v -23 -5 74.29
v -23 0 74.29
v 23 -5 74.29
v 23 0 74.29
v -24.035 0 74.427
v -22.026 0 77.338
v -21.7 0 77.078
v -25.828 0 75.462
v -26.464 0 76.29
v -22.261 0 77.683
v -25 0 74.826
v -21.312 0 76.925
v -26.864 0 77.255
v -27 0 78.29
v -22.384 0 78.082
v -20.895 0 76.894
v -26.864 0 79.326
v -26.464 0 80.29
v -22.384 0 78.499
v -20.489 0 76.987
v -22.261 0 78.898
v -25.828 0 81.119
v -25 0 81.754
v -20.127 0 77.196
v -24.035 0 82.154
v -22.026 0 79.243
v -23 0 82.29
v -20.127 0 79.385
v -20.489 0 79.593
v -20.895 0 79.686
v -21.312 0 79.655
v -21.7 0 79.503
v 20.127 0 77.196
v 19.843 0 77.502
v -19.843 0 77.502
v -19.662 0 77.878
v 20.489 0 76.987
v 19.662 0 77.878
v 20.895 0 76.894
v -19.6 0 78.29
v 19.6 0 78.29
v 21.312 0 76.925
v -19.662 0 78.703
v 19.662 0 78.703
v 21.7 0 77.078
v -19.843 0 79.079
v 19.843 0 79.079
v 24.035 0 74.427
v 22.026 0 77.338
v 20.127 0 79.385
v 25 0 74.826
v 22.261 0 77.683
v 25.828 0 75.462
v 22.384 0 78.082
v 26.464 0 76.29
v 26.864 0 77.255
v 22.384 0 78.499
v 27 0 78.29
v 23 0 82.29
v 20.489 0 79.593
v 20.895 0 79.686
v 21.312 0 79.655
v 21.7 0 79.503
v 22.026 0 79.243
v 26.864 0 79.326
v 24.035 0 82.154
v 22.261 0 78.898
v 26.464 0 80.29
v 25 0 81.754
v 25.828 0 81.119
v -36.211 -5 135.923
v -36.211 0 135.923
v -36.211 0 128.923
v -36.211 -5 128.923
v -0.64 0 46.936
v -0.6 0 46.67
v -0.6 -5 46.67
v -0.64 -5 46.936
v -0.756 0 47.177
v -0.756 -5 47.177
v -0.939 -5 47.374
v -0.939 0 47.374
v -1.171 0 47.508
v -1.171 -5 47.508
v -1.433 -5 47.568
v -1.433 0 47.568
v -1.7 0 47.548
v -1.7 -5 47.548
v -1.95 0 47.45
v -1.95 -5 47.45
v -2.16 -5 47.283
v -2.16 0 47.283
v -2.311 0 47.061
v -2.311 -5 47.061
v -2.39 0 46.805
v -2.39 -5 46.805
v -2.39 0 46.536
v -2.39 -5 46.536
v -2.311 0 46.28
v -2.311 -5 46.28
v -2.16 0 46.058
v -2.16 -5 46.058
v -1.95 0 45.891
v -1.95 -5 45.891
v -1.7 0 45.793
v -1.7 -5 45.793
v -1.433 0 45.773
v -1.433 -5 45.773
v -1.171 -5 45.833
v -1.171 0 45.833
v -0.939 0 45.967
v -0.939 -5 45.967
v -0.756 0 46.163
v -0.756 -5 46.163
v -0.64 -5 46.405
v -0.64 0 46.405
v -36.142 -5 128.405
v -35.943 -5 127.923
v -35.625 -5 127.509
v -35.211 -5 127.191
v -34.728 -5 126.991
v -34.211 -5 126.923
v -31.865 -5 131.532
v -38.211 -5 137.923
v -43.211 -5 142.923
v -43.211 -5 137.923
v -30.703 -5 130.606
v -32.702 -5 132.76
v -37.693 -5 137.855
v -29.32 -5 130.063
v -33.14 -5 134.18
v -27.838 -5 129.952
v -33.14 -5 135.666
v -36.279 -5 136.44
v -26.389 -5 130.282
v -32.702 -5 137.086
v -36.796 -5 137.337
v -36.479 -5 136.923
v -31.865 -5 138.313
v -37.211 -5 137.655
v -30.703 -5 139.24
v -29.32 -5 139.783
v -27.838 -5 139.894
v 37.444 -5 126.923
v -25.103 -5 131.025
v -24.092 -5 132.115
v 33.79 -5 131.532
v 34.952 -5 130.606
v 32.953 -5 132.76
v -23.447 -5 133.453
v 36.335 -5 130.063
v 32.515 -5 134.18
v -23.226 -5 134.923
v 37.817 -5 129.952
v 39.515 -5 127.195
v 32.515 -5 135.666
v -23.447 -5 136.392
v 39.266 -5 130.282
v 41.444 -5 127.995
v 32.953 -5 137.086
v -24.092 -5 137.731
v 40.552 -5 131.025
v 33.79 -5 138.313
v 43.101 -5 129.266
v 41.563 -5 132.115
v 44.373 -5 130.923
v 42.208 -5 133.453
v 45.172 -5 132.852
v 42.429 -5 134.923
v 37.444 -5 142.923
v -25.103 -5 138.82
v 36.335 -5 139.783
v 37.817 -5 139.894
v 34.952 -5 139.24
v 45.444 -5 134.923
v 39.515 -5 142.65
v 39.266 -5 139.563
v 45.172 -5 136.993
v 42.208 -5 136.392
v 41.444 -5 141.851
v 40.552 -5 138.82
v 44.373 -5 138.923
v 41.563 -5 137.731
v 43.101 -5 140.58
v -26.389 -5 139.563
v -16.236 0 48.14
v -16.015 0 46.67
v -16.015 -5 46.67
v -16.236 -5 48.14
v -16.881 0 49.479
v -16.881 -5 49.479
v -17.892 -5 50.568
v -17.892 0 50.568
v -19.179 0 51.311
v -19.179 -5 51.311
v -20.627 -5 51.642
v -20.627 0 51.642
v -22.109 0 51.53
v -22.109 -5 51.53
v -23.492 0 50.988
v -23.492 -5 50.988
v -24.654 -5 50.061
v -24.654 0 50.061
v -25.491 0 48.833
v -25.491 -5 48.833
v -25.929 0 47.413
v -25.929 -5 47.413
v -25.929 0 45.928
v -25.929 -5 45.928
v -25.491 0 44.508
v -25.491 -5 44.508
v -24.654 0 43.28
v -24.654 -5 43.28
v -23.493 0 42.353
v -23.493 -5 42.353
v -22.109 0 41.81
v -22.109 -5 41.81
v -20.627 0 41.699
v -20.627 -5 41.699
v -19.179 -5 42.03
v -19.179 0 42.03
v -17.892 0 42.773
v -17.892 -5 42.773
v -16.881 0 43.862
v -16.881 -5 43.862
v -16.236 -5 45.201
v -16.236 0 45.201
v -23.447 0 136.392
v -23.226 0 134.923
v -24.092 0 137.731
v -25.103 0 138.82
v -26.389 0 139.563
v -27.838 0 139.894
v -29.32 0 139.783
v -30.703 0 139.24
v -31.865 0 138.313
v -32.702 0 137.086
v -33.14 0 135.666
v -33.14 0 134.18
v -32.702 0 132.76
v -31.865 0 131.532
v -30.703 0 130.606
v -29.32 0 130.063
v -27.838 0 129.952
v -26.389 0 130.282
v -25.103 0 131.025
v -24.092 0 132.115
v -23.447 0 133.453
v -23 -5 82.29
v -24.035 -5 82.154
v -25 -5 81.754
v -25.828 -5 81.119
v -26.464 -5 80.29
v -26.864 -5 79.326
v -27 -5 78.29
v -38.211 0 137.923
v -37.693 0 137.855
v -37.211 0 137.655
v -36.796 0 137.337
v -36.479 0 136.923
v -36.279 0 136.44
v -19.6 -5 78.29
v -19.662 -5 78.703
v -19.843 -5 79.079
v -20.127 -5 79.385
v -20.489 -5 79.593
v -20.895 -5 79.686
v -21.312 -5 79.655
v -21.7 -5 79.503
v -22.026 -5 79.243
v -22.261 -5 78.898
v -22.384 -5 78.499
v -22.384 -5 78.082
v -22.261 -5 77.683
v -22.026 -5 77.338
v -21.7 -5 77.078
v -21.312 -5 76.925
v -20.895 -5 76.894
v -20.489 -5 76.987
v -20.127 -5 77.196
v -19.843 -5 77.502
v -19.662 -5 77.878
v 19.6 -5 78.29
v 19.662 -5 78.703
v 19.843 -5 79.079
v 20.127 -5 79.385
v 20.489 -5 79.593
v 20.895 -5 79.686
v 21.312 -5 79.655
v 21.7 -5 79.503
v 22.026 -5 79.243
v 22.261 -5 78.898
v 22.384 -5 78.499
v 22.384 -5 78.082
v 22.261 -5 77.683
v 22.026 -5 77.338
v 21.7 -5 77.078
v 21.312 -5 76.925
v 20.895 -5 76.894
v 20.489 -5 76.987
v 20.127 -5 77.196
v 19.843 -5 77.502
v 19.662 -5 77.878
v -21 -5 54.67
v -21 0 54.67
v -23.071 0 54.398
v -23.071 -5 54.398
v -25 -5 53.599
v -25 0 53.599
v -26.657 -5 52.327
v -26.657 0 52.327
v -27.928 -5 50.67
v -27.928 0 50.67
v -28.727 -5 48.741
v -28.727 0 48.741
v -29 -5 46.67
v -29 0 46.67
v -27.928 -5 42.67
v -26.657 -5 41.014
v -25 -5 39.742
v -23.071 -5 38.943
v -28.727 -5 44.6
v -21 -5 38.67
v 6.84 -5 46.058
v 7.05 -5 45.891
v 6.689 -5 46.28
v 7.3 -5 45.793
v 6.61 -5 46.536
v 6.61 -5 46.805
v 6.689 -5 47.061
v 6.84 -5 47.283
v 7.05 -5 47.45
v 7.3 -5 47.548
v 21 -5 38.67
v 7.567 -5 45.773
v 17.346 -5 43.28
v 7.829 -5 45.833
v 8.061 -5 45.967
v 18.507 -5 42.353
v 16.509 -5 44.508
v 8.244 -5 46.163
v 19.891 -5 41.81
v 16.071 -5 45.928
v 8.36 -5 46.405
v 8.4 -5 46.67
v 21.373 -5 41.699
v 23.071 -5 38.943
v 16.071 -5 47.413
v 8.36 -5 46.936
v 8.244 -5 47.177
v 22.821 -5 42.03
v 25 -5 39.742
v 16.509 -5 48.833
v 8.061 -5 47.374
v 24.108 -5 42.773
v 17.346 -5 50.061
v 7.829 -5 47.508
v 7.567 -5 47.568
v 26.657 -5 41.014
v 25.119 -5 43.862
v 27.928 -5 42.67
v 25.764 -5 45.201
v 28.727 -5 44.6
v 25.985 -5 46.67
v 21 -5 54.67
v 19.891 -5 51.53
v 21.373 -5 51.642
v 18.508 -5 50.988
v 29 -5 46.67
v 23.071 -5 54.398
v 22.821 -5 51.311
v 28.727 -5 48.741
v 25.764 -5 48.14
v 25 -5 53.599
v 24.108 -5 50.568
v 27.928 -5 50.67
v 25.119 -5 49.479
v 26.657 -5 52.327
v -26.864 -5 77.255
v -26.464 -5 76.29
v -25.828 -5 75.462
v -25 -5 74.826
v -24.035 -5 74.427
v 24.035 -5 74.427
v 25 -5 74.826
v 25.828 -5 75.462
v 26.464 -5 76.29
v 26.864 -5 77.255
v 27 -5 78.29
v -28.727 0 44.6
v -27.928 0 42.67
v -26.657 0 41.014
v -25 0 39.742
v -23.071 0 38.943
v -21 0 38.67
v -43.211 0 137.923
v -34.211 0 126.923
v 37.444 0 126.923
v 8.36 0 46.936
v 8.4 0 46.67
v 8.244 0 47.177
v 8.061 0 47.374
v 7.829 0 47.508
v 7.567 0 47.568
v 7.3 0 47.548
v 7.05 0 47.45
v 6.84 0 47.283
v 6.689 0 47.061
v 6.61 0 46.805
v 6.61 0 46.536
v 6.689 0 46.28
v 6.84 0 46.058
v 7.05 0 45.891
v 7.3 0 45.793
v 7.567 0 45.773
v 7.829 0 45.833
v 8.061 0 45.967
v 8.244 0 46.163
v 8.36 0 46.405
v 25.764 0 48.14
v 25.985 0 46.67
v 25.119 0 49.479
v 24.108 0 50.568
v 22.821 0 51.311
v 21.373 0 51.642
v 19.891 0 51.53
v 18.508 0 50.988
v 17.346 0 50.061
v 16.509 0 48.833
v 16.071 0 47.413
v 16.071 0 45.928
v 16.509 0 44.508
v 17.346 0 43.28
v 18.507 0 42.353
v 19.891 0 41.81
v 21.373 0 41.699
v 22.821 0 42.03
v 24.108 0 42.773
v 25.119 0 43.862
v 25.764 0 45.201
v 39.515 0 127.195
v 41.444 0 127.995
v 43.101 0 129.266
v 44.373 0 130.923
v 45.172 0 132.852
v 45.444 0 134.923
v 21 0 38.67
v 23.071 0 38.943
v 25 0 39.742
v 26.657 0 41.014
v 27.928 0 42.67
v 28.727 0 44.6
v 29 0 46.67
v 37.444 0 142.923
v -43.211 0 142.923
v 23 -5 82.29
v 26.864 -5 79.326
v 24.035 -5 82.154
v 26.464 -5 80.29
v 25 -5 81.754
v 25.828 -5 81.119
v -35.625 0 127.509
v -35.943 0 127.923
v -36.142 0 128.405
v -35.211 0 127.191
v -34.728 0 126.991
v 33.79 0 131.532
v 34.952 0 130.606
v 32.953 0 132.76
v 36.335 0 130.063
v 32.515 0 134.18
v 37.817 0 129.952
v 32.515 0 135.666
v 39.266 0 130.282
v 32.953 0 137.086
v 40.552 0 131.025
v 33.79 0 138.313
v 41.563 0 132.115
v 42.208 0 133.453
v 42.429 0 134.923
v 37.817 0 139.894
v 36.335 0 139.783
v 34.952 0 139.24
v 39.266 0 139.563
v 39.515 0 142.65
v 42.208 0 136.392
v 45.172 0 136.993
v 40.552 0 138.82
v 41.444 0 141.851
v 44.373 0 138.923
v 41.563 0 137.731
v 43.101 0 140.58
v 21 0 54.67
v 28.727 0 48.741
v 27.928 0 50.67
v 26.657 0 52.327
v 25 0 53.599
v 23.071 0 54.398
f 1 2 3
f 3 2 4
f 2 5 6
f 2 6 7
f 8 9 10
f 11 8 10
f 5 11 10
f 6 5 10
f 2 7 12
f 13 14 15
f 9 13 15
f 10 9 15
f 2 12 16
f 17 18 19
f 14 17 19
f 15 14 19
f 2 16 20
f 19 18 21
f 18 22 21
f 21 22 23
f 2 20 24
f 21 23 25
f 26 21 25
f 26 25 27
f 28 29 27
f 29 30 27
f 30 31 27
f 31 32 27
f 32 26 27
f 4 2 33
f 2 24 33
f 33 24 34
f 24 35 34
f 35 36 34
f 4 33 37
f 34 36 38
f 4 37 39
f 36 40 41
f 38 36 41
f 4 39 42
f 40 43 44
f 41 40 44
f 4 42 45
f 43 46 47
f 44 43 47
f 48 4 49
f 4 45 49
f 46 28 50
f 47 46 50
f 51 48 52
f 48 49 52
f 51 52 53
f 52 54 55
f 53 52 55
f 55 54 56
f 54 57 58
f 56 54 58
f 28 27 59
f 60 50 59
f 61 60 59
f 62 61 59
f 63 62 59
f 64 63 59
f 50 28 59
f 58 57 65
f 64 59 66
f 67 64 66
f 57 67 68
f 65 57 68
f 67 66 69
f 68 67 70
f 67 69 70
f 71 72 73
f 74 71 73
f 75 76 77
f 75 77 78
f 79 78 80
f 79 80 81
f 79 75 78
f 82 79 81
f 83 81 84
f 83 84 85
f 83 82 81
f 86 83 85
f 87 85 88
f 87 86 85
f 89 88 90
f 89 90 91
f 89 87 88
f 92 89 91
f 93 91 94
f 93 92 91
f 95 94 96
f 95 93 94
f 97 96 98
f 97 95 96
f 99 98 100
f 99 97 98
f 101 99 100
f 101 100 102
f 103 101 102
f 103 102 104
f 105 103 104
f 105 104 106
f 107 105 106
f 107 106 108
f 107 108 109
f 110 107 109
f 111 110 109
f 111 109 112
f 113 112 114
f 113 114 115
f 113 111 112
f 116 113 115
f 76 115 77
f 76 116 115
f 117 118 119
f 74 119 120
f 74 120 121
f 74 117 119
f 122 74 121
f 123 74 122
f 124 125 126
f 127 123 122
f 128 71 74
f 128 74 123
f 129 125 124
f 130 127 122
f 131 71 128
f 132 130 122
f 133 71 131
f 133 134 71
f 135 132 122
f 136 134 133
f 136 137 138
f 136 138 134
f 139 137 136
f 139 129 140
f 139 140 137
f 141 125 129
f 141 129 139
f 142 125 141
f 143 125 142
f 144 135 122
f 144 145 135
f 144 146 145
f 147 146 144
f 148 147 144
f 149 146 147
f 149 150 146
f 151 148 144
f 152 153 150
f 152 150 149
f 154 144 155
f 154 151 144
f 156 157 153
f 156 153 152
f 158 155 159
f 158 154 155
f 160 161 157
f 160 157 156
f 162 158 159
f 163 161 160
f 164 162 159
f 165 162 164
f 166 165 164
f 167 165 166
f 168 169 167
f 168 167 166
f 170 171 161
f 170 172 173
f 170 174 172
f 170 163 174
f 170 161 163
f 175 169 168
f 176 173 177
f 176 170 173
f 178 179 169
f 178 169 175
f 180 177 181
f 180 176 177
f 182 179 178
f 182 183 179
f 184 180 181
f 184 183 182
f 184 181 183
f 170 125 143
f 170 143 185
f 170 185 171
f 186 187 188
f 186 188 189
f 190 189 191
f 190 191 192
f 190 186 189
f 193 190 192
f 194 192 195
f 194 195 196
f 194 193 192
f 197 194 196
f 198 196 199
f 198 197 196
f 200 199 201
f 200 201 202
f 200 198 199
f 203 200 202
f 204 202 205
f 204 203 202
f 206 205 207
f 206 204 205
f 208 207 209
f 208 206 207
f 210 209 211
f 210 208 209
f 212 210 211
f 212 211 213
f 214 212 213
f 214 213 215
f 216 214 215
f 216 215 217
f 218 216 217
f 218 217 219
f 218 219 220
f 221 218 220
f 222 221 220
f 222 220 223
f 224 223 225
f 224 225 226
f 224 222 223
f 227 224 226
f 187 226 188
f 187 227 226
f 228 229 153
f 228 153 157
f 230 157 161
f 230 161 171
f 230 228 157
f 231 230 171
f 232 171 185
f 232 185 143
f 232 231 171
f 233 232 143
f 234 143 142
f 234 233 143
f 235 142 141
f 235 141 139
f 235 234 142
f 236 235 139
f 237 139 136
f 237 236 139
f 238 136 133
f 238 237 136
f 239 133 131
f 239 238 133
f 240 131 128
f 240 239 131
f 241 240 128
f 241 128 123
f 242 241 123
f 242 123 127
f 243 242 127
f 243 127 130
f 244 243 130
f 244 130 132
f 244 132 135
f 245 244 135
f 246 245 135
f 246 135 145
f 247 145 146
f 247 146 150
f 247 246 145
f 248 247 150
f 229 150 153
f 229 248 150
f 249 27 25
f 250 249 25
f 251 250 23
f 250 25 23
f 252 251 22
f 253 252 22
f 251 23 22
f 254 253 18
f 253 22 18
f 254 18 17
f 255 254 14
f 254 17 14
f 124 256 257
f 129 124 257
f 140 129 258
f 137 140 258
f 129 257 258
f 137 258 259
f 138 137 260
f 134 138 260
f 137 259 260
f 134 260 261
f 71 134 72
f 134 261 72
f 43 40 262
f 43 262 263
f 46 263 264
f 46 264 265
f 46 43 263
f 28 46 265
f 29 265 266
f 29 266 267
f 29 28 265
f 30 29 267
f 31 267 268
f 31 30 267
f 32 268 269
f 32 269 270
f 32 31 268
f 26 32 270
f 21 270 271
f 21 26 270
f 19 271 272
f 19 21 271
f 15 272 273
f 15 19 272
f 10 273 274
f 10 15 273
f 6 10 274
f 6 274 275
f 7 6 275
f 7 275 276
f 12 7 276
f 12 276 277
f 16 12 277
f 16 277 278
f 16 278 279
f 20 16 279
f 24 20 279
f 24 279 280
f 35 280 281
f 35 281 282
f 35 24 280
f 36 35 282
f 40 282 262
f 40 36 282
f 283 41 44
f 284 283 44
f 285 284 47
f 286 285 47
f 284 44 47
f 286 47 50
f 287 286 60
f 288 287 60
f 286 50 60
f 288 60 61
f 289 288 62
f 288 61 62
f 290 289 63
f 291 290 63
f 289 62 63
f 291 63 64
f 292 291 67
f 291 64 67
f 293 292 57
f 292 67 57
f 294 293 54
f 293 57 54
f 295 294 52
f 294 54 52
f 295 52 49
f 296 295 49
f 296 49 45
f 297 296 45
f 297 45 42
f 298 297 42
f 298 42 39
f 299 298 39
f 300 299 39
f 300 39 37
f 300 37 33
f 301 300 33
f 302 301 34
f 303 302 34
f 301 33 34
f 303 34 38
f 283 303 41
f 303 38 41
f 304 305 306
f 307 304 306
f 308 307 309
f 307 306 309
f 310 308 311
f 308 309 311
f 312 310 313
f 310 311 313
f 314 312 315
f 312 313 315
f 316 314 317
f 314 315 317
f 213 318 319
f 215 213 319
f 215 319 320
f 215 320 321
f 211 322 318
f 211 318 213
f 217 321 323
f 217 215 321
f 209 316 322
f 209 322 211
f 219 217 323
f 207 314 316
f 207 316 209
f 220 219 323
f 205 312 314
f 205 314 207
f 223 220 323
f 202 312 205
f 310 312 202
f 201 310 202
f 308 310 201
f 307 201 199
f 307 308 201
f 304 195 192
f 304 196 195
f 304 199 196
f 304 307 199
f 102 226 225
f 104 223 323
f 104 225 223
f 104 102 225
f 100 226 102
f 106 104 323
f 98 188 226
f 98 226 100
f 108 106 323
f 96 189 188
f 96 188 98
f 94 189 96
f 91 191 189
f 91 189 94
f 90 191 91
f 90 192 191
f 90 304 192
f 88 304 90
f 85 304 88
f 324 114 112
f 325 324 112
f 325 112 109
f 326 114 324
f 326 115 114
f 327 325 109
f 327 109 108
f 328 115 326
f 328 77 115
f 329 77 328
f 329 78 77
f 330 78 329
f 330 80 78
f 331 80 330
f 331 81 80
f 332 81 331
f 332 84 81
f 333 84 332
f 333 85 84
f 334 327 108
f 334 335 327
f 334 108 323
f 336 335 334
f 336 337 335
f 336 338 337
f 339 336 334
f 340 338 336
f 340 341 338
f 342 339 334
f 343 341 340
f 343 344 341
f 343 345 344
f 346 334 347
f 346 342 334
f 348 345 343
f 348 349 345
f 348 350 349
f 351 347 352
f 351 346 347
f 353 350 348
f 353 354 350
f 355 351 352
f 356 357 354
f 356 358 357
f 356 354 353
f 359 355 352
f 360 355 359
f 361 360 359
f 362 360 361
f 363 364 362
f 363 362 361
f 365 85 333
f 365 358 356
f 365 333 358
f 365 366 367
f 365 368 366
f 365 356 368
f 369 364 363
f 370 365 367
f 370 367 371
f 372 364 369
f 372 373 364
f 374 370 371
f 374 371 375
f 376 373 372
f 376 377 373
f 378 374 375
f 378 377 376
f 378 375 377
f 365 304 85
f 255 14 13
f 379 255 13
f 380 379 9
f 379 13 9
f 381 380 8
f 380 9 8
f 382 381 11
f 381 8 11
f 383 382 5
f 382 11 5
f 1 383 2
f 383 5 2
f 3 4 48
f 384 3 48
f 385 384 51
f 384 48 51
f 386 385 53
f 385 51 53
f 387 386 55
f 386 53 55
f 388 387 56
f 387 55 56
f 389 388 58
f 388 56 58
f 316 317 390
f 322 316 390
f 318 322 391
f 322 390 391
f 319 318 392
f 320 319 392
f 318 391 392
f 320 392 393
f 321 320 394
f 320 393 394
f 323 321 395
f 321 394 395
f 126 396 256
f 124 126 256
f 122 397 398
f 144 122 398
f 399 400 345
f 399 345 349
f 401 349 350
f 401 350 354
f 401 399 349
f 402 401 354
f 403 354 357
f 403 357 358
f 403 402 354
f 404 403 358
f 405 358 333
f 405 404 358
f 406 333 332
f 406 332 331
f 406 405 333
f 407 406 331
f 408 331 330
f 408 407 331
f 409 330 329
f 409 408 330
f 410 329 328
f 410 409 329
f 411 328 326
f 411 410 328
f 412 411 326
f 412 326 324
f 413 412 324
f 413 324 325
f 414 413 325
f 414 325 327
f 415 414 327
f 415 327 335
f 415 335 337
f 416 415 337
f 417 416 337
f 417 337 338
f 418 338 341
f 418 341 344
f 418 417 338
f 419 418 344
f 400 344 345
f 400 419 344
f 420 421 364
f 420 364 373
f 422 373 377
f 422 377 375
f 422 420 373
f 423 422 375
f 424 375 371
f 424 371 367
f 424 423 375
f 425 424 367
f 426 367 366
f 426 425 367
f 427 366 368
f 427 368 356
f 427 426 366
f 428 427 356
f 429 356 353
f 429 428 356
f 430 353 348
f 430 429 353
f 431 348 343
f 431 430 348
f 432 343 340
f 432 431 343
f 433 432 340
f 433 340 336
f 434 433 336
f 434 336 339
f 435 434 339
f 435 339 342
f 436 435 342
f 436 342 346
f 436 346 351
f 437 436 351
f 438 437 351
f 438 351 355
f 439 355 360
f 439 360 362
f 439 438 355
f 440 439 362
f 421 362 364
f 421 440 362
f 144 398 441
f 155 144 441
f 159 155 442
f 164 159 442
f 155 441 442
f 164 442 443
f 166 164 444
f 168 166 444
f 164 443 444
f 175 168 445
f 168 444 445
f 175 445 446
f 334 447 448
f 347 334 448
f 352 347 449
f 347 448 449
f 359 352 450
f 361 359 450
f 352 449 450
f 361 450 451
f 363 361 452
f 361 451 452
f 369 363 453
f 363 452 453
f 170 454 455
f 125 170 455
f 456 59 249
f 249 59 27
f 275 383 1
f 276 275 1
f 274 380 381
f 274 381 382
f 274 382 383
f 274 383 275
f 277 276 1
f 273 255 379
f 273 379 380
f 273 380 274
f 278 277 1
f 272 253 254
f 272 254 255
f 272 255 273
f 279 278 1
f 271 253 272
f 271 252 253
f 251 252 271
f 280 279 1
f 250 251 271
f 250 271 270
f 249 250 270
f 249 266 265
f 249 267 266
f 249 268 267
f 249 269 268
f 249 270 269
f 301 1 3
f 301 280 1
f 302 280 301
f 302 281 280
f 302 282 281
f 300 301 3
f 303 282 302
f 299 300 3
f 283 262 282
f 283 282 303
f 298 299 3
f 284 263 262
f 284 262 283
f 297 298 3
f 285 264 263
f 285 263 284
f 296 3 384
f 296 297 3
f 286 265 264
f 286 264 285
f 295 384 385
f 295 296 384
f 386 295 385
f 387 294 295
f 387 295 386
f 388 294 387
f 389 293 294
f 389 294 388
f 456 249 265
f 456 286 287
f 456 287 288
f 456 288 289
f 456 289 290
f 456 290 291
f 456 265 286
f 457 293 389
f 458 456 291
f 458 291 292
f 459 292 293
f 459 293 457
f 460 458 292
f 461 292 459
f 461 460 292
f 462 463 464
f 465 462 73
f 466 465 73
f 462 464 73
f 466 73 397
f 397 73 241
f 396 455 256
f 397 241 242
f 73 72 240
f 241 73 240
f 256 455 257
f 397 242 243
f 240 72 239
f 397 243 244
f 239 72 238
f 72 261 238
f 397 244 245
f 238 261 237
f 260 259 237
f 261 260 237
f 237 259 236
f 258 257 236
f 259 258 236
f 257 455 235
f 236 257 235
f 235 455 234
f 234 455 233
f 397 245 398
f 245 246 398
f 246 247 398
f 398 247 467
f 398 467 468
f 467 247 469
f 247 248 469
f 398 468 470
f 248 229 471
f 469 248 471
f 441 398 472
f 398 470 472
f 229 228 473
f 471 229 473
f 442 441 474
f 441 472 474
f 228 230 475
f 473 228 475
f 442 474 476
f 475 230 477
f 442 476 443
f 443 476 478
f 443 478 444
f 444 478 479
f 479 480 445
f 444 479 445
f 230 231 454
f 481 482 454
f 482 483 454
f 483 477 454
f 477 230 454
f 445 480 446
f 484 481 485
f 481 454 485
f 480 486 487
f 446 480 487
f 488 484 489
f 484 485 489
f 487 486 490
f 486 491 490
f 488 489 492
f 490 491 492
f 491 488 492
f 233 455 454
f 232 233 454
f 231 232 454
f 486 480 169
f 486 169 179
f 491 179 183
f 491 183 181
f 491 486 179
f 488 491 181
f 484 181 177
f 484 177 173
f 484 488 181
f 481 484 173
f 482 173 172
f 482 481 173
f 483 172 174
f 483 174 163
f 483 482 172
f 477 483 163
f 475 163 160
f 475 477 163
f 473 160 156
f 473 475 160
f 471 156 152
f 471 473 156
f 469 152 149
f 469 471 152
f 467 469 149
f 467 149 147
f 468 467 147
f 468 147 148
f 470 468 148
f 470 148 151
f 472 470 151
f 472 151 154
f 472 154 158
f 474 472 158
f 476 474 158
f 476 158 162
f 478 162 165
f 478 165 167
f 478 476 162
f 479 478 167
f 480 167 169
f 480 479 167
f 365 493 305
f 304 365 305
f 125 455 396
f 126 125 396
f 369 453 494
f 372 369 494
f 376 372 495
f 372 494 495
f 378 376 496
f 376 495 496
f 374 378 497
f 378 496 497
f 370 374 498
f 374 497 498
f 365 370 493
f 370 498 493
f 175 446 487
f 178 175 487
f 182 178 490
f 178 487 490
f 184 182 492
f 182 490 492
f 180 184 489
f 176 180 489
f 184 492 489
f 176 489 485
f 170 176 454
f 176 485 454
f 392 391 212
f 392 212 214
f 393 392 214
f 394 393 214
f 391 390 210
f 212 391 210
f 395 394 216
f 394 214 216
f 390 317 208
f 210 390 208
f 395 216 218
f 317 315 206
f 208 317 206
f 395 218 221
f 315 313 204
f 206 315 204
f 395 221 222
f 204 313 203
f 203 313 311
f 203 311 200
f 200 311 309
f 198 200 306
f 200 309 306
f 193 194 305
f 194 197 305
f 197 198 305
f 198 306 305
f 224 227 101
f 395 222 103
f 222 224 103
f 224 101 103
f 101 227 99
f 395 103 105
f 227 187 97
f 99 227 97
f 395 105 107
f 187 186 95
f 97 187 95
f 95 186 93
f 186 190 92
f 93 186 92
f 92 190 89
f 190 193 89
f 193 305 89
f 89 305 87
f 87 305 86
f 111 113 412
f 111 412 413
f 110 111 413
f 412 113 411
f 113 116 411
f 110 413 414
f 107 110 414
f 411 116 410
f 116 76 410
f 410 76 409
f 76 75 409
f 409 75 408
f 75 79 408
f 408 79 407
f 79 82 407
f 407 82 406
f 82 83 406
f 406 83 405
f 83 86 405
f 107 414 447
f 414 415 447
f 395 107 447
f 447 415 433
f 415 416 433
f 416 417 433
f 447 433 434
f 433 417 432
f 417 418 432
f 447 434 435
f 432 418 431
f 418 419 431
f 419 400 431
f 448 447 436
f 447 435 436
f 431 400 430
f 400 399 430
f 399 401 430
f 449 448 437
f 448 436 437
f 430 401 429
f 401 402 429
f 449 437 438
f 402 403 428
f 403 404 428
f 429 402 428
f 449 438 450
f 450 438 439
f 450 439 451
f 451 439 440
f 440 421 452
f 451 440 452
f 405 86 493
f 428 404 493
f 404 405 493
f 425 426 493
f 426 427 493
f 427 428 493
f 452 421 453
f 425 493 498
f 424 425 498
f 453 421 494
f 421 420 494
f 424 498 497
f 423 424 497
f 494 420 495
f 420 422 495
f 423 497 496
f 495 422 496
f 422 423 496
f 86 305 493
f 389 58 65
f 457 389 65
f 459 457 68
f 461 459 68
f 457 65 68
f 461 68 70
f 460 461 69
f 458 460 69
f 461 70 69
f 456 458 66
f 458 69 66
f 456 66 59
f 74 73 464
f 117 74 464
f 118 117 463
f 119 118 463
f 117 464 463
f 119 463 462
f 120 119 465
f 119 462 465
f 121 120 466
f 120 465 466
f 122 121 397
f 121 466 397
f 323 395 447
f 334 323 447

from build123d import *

# Parameters (mm, degrees)
F0_R     = 4.985
F0_R_2   = 1.4
F0_R_3   = 0.9
F1_DEPTH = 5


with BuildPart() as f1:
    # F0 (on Front) → F1 (new body)
    with BuildSketch(Plane.XZ):
        with BuildLine():
            Line((-34.210607, 126.922728), (37.444393, 126.922728))
            ThreePointArc((37.444393, 126.922728), (43.101247, 129.265874), (45.444393, 134.922728))
            ThreePointArc((45.444393, 134.922728), (43.101247, 140.579582), (37.444393, 142.922728))
            Line((37.444393, 142.922728), (-32.210607, 142.922728))
            Line((-32.210607, 142.922728), (-43.210607, 142.922728))
            Line((-43.210607, 142.922728), (-43.210607, 137.922728))
            Line((-43.210607, 137.922728), (-38.210607, 137.922728))
            ThreePointArc((-38.210607, 137.922728), (-36.796394, 137.336942), (-36.210607, 135.922728))
            Line((-36.210607, 135.922728), (-36.210607, 128.922728))
            ThreePointArc((-36.210607, 128.922728), (-35.624821, 127.508514), (-34.210607, 126.922728))
        make_face()
        with Locations((-28.210607, 134.922728)):
            Circle(F0_R, mode=Mode.SUBTRACT)
        with Locations((37.444393, 134.922728)):
            Circle(F0_R, mode=Mode.SUBTRACT)
        with BuildLine():
            Line((-23, 74.290269), (23, 74.290269))
            ThreePointArc((23, 74.290269), (25.828427, 75.461842), (27, 78.290269))
            ThreePointArc((27, 78.290269), (25.828427, 81.118696), (23, 82.290269))
            Line((23, 82.290269), (-23, 82.290269))
            ThreePointArc((-23, 82.290269), (-25.828427, 81.118696), (-27, 78.290269))
            ThreePointArc((-27, 78.290269), (-25.828427, 75.461842), (-23, 74.290269))
        make_face()
        with Locations((-21, 78.290269)):
            Circle(F0_R_2, mode=Mode.SUBTRACT)
        with BuildLine():
            ThreePointArc((22.4, 78.290269), (21, 76.890269), (19.6, 78.290269))
            ThreePointArc((19.6, 78.290269), (21, 79.690269), (22.4, 78.290269))
        make_face(mode=Mode.SUBTRACT)
        with BuildLine():
            Line((-21, 38.670482), (21, 38.670482))
            ThreePointArc((21, 38.670482), (26.656854, 41.013627), (29, 46.670482))
            ThreePointArc((29, 46.670482), (26.656854, 52.327336), (21, 54.670482))
            Line((21, 54.670482), (-21, 54.670482))
            ThreePointArc((-21, 54.670482), (-26.656854, 52.327336), (-29, 46.670482))
            ThreePointArc((-29, 46.670482), (-26.656854, 41.013627), (-21, 38.670482))
        make_face()
        with Locations((-21, 46.670482)):
            Circle(F0_R, mode=Mode.SUBTRACT)
        with Locations((-1.5, 46.670482)):
            Circle(F0_R_3, mode=Mode.SUBTRACT)
        with Locations((7.5, 46.670482)):
            Circle(F0_R_3, mode=Mode.SUBTRACT)
        with Locations((21, 46.670482)):
            Circle(F0_R, mode=Mode.SUBTRACT)
    extrude(amount=F1_DEPTH)


solid = f1.part
